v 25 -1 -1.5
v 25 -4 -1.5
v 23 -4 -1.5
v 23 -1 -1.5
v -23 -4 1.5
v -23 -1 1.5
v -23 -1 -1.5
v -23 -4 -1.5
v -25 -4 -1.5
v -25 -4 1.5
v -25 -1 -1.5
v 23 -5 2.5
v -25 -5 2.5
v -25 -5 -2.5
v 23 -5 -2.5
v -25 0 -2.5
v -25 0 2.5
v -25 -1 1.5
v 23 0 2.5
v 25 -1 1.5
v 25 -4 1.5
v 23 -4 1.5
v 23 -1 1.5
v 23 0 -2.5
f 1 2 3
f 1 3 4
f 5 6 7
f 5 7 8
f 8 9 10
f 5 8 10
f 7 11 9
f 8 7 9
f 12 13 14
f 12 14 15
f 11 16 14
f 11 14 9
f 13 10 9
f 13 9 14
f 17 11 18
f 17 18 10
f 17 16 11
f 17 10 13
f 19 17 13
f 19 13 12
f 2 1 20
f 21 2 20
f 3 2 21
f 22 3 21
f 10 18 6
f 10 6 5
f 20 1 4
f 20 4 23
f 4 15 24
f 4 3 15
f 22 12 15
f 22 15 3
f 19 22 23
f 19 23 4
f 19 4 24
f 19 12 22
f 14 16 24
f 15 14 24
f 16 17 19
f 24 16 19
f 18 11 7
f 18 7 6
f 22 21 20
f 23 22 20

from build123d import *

# Parameters (mm, degrees)
F0_W     = 50
F0_H     = 5
F1_DEPTH = 5
F2_W     = 3
F2_H     = 3
F3_DEPTH = 2
F4_W     = 5
F4_H     = 5
F4_W_2   = 3
F4_H_2   = 3
F5_DEPTH = 2


with BuildPart() as f1:
    # F0 (on Front) → F1 (new body)
    with BuildSketch(Plane.XZ):
        Rectangle(F0_W, F0_H)
    extrude(amount=F1_DEPTH)

    # F2 (on face) → F3 (cut)
    with BuildSketch(Plane(origin=(-25, 0, 0), x_dir=(0, -1, 0), z_dir=(-1, 0, 0))):
        with Locations((2.5, 0)):
            Rectangle(F2_W, F2_H)
    extrude(amount=-F3_DEPTH, mode=Mode.SUBTRACT)

    # F4 (on face) → F5 (cut)
    with BuildSketch(Plane.YZ.offset(25)):
        with Locations((-2.5, 0)):
            Rectangle(F4_W, F4_H)
        with Locations((-2.5, 0)):
            Rectangle(F4_W_2, F4_H_2, mode=Mode.SUBTRACT)
    extrude(amount=-F5_DEPTH, mode=Mode.SUBTRACT)


solid = f1.part
